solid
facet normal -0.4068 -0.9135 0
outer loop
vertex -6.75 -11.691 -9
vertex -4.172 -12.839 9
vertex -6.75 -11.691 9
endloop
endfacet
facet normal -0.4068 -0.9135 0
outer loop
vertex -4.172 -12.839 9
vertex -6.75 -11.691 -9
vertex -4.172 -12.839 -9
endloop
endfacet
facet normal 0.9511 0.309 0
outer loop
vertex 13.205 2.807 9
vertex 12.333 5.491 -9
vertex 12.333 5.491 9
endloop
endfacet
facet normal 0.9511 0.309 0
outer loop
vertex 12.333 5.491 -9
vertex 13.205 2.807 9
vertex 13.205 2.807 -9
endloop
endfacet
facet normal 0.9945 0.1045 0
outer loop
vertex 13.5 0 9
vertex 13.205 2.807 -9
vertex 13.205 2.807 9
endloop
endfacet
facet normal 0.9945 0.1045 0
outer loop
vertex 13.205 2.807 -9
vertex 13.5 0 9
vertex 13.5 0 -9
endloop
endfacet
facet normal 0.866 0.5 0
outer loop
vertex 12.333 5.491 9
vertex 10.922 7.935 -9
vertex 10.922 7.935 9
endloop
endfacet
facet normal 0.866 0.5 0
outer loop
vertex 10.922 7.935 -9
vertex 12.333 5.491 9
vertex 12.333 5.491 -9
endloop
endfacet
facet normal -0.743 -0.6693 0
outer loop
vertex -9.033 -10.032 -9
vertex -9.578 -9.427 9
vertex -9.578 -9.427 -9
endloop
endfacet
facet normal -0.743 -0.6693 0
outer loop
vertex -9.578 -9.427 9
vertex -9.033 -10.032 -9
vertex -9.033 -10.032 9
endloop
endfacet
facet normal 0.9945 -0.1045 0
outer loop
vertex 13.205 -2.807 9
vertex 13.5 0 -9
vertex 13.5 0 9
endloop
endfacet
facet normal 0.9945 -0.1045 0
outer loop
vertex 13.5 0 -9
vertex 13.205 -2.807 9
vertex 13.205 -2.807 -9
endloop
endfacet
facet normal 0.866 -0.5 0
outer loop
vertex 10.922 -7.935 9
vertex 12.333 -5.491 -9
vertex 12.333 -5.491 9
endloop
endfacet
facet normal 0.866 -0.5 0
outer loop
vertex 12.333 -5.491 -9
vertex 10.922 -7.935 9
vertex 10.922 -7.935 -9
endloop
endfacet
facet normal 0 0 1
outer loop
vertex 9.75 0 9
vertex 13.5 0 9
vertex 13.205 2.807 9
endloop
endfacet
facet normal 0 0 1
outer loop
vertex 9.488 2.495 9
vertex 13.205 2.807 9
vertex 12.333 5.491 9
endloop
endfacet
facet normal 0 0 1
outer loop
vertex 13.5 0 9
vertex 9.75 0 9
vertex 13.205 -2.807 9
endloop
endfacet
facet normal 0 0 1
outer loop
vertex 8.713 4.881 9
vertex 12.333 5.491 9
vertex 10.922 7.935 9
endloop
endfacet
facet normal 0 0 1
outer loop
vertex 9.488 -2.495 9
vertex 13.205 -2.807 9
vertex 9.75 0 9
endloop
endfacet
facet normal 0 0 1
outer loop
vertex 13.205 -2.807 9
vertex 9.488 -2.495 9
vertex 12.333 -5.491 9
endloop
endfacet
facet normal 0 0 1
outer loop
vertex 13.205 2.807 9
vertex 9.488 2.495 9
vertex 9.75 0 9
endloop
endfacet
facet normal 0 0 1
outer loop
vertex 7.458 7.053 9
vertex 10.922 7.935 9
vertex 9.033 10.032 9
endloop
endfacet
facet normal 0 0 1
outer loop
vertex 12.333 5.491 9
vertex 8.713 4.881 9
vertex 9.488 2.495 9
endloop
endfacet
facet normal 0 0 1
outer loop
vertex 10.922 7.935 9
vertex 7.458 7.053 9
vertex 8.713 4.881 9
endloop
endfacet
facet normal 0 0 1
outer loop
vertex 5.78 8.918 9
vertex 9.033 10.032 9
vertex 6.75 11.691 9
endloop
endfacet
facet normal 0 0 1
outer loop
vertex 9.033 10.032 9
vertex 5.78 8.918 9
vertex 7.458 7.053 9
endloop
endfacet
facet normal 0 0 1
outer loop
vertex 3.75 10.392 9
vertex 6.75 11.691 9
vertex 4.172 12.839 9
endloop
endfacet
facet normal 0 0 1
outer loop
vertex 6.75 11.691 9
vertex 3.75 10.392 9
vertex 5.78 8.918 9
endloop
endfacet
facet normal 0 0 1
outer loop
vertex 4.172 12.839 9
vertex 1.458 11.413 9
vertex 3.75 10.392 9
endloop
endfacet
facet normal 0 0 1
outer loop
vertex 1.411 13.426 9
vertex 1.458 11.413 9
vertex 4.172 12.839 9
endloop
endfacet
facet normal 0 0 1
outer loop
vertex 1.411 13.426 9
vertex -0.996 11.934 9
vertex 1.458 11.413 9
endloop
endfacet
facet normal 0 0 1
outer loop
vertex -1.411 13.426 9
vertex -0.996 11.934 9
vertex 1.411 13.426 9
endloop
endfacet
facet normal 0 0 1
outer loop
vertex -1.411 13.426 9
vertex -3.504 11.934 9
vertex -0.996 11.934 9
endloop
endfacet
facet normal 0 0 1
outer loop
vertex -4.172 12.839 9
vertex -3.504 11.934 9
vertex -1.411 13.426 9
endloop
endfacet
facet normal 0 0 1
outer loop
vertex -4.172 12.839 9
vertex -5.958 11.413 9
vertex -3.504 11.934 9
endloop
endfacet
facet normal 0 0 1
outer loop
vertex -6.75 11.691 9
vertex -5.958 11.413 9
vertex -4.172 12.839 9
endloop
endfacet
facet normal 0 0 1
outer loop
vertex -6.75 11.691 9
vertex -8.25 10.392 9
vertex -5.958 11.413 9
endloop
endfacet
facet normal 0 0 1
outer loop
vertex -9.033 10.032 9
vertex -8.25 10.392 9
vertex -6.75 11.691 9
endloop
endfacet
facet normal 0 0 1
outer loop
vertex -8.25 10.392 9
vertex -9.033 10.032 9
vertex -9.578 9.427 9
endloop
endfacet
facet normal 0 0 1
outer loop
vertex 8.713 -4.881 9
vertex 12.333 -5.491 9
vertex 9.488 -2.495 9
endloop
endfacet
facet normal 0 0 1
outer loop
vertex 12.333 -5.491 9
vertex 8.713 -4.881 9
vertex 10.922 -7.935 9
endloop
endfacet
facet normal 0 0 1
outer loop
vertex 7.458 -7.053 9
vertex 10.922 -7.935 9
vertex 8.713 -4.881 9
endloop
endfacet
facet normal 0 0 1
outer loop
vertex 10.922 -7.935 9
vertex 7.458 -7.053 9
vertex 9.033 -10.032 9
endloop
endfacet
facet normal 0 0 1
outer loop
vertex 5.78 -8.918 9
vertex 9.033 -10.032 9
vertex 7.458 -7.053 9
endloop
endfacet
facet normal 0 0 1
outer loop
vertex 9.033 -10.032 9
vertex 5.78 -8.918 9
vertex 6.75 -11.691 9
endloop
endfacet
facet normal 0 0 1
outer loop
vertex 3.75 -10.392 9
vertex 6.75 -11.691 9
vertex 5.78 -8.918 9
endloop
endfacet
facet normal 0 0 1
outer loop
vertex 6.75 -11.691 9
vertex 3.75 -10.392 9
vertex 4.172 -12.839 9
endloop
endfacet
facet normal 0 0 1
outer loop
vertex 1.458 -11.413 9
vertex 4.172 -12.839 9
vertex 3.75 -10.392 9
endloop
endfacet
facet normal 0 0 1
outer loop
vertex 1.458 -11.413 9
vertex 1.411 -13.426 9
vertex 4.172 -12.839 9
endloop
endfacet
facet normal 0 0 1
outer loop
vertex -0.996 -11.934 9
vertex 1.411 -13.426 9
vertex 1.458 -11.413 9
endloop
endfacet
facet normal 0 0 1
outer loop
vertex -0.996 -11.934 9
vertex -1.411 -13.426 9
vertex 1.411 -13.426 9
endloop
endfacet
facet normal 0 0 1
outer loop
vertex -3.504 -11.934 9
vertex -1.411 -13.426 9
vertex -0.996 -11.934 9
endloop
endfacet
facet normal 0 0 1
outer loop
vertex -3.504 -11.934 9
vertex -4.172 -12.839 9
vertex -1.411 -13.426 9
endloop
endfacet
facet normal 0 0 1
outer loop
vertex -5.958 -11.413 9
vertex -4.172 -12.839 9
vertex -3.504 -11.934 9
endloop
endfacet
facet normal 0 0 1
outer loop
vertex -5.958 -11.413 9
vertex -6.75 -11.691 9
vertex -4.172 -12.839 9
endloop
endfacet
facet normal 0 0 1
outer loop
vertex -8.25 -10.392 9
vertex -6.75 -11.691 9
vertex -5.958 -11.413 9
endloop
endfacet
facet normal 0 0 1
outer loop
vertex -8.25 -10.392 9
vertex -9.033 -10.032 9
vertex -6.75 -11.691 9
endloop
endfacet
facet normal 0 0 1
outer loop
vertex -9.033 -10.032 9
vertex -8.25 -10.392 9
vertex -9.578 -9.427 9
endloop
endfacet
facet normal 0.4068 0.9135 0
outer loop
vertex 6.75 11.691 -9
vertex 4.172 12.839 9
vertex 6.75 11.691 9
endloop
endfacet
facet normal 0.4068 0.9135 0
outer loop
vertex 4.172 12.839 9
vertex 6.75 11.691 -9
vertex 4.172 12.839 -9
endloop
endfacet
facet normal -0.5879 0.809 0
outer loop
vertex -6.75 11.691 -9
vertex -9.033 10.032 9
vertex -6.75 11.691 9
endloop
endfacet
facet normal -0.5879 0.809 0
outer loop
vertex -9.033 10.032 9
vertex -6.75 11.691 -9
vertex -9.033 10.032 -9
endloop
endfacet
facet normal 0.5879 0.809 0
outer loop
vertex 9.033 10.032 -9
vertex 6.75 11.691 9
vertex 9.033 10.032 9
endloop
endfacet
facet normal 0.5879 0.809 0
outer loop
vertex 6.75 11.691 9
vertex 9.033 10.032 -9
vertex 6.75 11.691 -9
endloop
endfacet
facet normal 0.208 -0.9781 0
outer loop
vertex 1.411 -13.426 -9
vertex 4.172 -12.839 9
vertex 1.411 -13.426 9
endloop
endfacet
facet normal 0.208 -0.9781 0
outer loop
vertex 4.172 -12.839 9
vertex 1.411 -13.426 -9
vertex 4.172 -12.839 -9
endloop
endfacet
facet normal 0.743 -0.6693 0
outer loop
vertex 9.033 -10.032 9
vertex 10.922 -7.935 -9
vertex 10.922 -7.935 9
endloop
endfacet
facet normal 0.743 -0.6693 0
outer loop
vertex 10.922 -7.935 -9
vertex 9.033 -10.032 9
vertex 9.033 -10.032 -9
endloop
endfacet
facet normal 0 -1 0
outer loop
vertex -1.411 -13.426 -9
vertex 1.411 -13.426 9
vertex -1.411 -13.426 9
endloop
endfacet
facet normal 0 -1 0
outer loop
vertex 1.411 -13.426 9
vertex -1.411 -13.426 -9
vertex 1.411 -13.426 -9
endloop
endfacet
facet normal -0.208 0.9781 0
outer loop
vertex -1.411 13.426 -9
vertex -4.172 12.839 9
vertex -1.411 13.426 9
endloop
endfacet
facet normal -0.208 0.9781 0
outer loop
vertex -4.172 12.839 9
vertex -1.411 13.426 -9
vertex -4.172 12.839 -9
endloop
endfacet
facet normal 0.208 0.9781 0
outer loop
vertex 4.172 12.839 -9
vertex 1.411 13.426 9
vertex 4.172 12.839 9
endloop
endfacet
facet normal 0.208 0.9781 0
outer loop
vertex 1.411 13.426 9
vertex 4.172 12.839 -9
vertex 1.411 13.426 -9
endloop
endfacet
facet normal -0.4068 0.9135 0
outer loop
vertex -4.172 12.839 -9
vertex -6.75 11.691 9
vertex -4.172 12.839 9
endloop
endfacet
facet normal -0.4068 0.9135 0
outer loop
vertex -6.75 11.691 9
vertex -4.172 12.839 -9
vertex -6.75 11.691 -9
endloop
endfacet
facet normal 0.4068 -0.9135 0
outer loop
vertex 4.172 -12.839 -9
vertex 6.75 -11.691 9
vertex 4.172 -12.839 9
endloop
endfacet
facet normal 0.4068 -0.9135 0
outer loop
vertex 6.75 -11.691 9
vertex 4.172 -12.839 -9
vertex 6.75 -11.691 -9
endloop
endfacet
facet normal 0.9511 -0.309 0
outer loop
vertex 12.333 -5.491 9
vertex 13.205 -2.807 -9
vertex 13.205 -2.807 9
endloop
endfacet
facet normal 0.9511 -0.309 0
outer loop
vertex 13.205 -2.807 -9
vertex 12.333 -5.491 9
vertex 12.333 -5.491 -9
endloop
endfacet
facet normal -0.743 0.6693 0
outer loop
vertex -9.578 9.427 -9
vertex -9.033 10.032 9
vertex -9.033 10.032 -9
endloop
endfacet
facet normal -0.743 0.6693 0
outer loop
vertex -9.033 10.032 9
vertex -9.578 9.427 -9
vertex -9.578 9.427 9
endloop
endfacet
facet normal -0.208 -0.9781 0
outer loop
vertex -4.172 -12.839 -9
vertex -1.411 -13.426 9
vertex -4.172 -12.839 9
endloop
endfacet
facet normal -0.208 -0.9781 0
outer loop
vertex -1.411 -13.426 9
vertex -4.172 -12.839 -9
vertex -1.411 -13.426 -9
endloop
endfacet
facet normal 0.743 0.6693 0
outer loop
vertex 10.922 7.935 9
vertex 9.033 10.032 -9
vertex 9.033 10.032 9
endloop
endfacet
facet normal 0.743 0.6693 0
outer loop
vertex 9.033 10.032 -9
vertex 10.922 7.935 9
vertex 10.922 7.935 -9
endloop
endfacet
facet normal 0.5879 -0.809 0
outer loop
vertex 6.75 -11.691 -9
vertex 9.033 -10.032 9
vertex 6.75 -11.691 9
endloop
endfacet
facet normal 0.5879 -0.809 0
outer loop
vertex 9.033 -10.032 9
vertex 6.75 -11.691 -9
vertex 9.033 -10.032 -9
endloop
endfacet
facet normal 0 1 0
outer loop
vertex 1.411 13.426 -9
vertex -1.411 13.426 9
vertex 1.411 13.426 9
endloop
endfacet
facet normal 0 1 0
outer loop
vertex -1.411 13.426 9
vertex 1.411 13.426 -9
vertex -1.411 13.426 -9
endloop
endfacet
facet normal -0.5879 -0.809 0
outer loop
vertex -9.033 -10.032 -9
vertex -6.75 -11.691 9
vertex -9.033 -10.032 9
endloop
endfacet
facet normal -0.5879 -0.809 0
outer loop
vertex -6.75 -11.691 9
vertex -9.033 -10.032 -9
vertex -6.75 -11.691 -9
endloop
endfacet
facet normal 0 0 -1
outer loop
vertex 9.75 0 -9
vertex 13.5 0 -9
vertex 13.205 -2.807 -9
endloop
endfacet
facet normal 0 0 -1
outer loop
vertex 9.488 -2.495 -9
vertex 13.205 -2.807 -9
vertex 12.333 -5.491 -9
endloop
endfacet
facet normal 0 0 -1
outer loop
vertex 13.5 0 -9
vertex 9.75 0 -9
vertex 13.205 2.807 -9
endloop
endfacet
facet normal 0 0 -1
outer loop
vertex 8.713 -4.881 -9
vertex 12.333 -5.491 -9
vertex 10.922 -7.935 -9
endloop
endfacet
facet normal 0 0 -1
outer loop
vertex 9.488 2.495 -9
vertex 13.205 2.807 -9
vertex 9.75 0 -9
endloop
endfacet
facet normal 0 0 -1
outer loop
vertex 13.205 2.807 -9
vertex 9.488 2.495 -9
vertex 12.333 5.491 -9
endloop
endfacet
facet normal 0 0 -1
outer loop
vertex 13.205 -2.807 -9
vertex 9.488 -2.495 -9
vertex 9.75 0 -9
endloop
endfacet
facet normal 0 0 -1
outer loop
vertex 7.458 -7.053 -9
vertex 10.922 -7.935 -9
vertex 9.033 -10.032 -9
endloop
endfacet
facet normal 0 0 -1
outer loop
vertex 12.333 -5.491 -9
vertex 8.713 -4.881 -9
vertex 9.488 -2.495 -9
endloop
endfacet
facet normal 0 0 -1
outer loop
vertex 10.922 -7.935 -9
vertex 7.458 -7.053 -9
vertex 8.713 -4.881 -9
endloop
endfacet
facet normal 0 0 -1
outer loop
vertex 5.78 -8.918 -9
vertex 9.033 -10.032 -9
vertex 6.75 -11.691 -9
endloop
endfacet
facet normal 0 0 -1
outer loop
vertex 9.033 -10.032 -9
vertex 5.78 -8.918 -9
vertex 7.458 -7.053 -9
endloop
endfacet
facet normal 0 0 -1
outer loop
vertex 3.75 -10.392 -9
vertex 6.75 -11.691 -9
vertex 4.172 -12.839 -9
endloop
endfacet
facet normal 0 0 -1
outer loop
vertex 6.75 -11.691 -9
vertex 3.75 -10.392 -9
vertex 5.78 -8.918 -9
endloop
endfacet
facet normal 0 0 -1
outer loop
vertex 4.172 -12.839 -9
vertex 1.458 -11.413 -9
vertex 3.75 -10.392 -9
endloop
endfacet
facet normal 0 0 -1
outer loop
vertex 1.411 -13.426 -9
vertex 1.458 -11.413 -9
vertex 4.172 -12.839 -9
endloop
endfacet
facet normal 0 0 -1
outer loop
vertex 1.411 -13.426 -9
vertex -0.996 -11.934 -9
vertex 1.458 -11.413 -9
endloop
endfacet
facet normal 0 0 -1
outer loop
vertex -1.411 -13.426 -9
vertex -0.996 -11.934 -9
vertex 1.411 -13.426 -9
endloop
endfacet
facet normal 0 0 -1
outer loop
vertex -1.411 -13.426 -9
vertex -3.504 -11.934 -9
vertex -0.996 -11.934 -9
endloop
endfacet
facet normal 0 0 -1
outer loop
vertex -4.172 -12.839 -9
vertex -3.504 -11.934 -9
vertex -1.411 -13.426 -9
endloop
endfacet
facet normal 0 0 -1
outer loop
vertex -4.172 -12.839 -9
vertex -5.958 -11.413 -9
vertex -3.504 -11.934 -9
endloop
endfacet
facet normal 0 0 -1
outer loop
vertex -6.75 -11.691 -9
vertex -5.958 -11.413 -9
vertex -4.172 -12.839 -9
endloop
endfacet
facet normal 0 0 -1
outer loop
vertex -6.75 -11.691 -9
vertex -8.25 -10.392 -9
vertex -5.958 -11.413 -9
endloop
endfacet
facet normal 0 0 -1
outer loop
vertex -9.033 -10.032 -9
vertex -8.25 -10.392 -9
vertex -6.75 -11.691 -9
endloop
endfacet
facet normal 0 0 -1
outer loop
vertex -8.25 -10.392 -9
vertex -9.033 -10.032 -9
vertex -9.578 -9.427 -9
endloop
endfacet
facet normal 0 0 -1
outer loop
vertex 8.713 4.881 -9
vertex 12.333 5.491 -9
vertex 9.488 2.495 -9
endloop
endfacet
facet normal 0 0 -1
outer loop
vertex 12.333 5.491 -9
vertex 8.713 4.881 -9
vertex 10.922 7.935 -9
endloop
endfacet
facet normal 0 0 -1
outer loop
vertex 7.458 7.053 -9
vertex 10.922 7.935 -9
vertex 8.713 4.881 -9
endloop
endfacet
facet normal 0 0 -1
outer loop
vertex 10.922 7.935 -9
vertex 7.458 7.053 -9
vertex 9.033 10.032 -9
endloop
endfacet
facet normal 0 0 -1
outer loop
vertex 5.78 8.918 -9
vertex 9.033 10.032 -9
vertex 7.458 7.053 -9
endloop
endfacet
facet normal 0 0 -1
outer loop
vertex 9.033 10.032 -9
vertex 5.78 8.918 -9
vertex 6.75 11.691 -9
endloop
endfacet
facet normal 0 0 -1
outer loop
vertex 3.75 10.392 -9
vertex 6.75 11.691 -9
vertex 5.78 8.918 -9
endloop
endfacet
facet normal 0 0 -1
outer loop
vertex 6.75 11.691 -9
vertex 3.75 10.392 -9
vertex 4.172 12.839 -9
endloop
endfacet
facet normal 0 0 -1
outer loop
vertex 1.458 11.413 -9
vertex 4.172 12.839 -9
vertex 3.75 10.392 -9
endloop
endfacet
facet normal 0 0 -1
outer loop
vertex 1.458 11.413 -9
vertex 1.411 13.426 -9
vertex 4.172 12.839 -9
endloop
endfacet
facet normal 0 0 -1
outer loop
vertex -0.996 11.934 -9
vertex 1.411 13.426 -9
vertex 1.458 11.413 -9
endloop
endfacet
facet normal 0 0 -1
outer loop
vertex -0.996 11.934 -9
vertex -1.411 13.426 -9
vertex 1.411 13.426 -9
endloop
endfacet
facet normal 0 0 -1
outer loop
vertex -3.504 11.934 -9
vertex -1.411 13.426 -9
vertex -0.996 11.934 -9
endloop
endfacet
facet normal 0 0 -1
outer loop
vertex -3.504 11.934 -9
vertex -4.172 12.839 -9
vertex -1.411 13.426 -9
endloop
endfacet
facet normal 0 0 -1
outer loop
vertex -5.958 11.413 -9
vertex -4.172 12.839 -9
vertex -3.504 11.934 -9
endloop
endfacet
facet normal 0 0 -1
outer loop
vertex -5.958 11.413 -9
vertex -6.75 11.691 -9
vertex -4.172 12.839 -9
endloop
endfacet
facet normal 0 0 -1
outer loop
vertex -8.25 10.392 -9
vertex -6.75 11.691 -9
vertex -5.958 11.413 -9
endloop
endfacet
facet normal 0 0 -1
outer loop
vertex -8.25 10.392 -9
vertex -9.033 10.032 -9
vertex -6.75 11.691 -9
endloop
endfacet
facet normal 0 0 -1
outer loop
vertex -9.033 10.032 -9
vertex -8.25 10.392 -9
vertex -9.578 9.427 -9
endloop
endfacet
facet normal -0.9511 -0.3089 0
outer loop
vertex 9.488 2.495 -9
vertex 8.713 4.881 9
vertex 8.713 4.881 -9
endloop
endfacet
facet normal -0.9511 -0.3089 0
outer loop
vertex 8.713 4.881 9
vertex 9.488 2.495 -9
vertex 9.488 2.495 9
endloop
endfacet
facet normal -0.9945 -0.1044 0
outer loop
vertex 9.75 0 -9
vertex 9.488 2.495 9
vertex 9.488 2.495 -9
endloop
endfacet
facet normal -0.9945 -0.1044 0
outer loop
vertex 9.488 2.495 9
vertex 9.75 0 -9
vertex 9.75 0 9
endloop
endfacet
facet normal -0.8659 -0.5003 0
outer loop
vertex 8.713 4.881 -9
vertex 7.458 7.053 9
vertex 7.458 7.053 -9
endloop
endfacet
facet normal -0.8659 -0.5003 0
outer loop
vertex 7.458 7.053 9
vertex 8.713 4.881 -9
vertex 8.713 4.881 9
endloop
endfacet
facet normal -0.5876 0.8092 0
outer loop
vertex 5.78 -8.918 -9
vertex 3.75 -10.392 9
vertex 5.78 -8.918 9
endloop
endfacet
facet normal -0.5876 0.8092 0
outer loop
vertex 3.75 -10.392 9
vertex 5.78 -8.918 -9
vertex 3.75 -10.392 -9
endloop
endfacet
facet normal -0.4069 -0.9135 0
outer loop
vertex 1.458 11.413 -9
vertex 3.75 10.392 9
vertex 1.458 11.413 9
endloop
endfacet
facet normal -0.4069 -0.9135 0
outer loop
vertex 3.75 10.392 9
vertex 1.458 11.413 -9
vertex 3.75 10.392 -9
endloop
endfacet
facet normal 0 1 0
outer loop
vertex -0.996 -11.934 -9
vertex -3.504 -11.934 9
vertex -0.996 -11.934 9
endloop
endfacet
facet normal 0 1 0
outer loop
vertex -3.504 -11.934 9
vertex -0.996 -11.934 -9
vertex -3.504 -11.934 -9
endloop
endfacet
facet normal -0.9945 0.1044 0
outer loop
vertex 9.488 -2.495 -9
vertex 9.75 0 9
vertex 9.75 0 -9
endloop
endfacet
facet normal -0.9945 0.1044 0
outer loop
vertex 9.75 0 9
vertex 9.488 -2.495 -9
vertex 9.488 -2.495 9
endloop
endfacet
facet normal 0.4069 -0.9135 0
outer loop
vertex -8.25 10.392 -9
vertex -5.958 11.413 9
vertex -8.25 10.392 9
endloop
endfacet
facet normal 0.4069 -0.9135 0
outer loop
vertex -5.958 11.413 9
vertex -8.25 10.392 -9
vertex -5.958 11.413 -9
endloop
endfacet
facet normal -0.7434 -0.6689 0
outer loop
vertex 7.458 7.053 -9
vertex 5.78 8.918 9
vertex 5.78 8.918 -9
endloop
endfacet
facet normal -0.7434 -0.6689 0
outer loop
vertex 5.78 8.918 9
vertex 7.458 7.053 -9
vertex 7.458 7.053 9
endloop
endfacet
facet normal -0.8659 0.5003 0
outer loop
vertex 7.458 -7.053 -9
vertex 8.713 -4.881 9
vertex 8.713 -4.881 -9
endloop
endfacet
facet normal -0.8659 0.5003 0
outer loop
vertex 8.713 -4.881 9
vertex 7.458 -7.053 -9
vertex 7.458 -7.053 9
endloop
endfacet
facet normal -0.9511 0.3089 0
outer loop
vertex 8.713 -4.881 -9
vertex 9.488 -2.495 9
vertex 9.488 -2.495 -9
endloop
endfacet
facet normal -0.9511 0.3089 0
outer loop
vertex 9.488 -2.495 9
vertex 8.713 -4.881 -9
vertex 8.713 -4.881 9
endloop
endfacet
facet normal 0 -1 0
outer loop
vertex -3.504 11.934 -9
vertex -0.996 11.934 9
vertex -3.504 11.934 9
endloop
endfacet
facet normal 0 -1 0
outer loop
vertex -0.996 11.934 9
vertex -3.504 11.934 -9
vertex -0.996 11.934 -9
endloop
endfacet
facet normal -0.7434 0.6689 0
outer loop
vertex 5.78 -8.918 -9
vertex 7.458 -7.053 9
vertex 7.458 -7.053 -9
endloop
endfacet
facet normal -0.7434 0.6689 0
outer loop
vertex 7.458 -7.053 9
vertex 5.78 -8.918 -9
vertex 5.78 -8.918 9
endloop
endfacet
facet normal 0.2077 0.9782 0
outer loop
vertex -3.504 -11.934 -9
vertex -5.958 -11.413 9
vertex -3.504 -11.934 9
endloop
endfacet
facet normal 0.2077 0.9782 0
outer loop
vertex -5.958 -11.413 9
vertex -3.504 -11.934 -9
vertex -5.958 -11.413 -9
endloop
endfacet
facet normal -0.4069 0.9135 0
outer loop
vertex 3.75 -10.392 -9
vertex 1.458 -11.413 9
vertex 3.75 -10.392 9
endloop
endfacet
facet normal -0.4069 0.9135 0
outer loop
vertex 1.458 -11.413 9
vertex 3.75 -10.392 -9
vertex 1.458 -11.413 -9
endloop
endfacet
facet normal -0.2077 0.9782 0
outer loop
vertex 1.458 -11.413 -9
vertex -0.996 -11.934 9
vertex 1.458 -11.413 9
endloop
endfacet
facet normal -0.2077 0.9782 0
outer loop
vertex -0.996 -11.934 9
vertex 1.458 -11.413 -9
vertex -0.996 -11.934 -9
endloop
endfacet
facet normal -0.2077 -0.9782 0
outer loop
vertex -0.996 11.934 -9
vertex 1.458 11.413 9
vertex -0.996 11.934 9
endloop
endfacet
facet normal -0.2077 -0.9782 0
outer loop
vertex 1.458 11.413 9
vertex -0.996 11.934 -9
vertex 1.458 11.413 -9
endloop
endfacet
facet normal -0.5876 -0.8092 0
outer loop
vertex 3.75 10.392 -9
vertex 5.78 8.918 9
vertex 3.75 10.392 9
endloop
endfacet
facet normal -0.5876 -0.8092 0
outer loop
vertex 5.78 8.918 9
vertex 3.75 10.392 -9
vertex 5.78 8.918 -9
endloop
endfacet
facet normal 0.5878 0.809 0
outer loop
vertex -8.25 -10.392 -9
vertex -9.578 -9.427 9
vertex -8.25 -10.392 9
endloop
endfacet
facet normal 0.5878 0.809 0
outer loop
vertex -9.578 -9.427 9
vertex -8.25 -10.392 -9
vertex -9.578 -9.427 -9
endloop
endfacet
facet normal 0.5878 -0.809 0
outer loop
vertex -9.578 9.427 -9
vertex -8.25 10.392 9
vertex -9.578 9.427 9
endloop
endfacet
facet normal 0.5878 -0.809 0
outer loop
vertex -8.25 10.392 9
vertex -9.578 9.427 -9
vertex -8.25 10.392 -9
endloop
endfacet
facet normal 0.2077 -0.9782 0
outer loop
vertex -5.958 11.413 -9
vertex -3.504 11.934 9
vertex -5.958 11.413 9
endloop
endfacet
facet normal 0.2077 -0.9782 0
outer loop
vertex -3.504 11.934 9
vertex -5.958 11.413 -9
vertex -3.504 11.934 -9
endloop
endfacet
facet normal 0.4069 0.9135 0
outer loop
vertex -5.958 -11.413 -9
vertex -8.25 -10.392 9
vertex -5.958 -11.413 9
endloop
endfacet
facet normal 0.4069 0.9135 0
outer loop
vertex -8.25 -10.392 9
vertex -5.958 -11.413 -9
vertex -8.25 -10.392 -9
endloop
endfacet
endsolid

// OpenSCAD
module insert( height = 18, inside = 12, outside = 13.5 )
{
    a = 27/2;
    b = 21/2;
    d = (outside - inside)/2 - 3;
    
    difference() {
        cylinder( r=outside, h = height, center = true );
        translate( [d, 0, 0] )
        cylinder( r = inside, h = height + 1, center = true);
    }
}

insert();
